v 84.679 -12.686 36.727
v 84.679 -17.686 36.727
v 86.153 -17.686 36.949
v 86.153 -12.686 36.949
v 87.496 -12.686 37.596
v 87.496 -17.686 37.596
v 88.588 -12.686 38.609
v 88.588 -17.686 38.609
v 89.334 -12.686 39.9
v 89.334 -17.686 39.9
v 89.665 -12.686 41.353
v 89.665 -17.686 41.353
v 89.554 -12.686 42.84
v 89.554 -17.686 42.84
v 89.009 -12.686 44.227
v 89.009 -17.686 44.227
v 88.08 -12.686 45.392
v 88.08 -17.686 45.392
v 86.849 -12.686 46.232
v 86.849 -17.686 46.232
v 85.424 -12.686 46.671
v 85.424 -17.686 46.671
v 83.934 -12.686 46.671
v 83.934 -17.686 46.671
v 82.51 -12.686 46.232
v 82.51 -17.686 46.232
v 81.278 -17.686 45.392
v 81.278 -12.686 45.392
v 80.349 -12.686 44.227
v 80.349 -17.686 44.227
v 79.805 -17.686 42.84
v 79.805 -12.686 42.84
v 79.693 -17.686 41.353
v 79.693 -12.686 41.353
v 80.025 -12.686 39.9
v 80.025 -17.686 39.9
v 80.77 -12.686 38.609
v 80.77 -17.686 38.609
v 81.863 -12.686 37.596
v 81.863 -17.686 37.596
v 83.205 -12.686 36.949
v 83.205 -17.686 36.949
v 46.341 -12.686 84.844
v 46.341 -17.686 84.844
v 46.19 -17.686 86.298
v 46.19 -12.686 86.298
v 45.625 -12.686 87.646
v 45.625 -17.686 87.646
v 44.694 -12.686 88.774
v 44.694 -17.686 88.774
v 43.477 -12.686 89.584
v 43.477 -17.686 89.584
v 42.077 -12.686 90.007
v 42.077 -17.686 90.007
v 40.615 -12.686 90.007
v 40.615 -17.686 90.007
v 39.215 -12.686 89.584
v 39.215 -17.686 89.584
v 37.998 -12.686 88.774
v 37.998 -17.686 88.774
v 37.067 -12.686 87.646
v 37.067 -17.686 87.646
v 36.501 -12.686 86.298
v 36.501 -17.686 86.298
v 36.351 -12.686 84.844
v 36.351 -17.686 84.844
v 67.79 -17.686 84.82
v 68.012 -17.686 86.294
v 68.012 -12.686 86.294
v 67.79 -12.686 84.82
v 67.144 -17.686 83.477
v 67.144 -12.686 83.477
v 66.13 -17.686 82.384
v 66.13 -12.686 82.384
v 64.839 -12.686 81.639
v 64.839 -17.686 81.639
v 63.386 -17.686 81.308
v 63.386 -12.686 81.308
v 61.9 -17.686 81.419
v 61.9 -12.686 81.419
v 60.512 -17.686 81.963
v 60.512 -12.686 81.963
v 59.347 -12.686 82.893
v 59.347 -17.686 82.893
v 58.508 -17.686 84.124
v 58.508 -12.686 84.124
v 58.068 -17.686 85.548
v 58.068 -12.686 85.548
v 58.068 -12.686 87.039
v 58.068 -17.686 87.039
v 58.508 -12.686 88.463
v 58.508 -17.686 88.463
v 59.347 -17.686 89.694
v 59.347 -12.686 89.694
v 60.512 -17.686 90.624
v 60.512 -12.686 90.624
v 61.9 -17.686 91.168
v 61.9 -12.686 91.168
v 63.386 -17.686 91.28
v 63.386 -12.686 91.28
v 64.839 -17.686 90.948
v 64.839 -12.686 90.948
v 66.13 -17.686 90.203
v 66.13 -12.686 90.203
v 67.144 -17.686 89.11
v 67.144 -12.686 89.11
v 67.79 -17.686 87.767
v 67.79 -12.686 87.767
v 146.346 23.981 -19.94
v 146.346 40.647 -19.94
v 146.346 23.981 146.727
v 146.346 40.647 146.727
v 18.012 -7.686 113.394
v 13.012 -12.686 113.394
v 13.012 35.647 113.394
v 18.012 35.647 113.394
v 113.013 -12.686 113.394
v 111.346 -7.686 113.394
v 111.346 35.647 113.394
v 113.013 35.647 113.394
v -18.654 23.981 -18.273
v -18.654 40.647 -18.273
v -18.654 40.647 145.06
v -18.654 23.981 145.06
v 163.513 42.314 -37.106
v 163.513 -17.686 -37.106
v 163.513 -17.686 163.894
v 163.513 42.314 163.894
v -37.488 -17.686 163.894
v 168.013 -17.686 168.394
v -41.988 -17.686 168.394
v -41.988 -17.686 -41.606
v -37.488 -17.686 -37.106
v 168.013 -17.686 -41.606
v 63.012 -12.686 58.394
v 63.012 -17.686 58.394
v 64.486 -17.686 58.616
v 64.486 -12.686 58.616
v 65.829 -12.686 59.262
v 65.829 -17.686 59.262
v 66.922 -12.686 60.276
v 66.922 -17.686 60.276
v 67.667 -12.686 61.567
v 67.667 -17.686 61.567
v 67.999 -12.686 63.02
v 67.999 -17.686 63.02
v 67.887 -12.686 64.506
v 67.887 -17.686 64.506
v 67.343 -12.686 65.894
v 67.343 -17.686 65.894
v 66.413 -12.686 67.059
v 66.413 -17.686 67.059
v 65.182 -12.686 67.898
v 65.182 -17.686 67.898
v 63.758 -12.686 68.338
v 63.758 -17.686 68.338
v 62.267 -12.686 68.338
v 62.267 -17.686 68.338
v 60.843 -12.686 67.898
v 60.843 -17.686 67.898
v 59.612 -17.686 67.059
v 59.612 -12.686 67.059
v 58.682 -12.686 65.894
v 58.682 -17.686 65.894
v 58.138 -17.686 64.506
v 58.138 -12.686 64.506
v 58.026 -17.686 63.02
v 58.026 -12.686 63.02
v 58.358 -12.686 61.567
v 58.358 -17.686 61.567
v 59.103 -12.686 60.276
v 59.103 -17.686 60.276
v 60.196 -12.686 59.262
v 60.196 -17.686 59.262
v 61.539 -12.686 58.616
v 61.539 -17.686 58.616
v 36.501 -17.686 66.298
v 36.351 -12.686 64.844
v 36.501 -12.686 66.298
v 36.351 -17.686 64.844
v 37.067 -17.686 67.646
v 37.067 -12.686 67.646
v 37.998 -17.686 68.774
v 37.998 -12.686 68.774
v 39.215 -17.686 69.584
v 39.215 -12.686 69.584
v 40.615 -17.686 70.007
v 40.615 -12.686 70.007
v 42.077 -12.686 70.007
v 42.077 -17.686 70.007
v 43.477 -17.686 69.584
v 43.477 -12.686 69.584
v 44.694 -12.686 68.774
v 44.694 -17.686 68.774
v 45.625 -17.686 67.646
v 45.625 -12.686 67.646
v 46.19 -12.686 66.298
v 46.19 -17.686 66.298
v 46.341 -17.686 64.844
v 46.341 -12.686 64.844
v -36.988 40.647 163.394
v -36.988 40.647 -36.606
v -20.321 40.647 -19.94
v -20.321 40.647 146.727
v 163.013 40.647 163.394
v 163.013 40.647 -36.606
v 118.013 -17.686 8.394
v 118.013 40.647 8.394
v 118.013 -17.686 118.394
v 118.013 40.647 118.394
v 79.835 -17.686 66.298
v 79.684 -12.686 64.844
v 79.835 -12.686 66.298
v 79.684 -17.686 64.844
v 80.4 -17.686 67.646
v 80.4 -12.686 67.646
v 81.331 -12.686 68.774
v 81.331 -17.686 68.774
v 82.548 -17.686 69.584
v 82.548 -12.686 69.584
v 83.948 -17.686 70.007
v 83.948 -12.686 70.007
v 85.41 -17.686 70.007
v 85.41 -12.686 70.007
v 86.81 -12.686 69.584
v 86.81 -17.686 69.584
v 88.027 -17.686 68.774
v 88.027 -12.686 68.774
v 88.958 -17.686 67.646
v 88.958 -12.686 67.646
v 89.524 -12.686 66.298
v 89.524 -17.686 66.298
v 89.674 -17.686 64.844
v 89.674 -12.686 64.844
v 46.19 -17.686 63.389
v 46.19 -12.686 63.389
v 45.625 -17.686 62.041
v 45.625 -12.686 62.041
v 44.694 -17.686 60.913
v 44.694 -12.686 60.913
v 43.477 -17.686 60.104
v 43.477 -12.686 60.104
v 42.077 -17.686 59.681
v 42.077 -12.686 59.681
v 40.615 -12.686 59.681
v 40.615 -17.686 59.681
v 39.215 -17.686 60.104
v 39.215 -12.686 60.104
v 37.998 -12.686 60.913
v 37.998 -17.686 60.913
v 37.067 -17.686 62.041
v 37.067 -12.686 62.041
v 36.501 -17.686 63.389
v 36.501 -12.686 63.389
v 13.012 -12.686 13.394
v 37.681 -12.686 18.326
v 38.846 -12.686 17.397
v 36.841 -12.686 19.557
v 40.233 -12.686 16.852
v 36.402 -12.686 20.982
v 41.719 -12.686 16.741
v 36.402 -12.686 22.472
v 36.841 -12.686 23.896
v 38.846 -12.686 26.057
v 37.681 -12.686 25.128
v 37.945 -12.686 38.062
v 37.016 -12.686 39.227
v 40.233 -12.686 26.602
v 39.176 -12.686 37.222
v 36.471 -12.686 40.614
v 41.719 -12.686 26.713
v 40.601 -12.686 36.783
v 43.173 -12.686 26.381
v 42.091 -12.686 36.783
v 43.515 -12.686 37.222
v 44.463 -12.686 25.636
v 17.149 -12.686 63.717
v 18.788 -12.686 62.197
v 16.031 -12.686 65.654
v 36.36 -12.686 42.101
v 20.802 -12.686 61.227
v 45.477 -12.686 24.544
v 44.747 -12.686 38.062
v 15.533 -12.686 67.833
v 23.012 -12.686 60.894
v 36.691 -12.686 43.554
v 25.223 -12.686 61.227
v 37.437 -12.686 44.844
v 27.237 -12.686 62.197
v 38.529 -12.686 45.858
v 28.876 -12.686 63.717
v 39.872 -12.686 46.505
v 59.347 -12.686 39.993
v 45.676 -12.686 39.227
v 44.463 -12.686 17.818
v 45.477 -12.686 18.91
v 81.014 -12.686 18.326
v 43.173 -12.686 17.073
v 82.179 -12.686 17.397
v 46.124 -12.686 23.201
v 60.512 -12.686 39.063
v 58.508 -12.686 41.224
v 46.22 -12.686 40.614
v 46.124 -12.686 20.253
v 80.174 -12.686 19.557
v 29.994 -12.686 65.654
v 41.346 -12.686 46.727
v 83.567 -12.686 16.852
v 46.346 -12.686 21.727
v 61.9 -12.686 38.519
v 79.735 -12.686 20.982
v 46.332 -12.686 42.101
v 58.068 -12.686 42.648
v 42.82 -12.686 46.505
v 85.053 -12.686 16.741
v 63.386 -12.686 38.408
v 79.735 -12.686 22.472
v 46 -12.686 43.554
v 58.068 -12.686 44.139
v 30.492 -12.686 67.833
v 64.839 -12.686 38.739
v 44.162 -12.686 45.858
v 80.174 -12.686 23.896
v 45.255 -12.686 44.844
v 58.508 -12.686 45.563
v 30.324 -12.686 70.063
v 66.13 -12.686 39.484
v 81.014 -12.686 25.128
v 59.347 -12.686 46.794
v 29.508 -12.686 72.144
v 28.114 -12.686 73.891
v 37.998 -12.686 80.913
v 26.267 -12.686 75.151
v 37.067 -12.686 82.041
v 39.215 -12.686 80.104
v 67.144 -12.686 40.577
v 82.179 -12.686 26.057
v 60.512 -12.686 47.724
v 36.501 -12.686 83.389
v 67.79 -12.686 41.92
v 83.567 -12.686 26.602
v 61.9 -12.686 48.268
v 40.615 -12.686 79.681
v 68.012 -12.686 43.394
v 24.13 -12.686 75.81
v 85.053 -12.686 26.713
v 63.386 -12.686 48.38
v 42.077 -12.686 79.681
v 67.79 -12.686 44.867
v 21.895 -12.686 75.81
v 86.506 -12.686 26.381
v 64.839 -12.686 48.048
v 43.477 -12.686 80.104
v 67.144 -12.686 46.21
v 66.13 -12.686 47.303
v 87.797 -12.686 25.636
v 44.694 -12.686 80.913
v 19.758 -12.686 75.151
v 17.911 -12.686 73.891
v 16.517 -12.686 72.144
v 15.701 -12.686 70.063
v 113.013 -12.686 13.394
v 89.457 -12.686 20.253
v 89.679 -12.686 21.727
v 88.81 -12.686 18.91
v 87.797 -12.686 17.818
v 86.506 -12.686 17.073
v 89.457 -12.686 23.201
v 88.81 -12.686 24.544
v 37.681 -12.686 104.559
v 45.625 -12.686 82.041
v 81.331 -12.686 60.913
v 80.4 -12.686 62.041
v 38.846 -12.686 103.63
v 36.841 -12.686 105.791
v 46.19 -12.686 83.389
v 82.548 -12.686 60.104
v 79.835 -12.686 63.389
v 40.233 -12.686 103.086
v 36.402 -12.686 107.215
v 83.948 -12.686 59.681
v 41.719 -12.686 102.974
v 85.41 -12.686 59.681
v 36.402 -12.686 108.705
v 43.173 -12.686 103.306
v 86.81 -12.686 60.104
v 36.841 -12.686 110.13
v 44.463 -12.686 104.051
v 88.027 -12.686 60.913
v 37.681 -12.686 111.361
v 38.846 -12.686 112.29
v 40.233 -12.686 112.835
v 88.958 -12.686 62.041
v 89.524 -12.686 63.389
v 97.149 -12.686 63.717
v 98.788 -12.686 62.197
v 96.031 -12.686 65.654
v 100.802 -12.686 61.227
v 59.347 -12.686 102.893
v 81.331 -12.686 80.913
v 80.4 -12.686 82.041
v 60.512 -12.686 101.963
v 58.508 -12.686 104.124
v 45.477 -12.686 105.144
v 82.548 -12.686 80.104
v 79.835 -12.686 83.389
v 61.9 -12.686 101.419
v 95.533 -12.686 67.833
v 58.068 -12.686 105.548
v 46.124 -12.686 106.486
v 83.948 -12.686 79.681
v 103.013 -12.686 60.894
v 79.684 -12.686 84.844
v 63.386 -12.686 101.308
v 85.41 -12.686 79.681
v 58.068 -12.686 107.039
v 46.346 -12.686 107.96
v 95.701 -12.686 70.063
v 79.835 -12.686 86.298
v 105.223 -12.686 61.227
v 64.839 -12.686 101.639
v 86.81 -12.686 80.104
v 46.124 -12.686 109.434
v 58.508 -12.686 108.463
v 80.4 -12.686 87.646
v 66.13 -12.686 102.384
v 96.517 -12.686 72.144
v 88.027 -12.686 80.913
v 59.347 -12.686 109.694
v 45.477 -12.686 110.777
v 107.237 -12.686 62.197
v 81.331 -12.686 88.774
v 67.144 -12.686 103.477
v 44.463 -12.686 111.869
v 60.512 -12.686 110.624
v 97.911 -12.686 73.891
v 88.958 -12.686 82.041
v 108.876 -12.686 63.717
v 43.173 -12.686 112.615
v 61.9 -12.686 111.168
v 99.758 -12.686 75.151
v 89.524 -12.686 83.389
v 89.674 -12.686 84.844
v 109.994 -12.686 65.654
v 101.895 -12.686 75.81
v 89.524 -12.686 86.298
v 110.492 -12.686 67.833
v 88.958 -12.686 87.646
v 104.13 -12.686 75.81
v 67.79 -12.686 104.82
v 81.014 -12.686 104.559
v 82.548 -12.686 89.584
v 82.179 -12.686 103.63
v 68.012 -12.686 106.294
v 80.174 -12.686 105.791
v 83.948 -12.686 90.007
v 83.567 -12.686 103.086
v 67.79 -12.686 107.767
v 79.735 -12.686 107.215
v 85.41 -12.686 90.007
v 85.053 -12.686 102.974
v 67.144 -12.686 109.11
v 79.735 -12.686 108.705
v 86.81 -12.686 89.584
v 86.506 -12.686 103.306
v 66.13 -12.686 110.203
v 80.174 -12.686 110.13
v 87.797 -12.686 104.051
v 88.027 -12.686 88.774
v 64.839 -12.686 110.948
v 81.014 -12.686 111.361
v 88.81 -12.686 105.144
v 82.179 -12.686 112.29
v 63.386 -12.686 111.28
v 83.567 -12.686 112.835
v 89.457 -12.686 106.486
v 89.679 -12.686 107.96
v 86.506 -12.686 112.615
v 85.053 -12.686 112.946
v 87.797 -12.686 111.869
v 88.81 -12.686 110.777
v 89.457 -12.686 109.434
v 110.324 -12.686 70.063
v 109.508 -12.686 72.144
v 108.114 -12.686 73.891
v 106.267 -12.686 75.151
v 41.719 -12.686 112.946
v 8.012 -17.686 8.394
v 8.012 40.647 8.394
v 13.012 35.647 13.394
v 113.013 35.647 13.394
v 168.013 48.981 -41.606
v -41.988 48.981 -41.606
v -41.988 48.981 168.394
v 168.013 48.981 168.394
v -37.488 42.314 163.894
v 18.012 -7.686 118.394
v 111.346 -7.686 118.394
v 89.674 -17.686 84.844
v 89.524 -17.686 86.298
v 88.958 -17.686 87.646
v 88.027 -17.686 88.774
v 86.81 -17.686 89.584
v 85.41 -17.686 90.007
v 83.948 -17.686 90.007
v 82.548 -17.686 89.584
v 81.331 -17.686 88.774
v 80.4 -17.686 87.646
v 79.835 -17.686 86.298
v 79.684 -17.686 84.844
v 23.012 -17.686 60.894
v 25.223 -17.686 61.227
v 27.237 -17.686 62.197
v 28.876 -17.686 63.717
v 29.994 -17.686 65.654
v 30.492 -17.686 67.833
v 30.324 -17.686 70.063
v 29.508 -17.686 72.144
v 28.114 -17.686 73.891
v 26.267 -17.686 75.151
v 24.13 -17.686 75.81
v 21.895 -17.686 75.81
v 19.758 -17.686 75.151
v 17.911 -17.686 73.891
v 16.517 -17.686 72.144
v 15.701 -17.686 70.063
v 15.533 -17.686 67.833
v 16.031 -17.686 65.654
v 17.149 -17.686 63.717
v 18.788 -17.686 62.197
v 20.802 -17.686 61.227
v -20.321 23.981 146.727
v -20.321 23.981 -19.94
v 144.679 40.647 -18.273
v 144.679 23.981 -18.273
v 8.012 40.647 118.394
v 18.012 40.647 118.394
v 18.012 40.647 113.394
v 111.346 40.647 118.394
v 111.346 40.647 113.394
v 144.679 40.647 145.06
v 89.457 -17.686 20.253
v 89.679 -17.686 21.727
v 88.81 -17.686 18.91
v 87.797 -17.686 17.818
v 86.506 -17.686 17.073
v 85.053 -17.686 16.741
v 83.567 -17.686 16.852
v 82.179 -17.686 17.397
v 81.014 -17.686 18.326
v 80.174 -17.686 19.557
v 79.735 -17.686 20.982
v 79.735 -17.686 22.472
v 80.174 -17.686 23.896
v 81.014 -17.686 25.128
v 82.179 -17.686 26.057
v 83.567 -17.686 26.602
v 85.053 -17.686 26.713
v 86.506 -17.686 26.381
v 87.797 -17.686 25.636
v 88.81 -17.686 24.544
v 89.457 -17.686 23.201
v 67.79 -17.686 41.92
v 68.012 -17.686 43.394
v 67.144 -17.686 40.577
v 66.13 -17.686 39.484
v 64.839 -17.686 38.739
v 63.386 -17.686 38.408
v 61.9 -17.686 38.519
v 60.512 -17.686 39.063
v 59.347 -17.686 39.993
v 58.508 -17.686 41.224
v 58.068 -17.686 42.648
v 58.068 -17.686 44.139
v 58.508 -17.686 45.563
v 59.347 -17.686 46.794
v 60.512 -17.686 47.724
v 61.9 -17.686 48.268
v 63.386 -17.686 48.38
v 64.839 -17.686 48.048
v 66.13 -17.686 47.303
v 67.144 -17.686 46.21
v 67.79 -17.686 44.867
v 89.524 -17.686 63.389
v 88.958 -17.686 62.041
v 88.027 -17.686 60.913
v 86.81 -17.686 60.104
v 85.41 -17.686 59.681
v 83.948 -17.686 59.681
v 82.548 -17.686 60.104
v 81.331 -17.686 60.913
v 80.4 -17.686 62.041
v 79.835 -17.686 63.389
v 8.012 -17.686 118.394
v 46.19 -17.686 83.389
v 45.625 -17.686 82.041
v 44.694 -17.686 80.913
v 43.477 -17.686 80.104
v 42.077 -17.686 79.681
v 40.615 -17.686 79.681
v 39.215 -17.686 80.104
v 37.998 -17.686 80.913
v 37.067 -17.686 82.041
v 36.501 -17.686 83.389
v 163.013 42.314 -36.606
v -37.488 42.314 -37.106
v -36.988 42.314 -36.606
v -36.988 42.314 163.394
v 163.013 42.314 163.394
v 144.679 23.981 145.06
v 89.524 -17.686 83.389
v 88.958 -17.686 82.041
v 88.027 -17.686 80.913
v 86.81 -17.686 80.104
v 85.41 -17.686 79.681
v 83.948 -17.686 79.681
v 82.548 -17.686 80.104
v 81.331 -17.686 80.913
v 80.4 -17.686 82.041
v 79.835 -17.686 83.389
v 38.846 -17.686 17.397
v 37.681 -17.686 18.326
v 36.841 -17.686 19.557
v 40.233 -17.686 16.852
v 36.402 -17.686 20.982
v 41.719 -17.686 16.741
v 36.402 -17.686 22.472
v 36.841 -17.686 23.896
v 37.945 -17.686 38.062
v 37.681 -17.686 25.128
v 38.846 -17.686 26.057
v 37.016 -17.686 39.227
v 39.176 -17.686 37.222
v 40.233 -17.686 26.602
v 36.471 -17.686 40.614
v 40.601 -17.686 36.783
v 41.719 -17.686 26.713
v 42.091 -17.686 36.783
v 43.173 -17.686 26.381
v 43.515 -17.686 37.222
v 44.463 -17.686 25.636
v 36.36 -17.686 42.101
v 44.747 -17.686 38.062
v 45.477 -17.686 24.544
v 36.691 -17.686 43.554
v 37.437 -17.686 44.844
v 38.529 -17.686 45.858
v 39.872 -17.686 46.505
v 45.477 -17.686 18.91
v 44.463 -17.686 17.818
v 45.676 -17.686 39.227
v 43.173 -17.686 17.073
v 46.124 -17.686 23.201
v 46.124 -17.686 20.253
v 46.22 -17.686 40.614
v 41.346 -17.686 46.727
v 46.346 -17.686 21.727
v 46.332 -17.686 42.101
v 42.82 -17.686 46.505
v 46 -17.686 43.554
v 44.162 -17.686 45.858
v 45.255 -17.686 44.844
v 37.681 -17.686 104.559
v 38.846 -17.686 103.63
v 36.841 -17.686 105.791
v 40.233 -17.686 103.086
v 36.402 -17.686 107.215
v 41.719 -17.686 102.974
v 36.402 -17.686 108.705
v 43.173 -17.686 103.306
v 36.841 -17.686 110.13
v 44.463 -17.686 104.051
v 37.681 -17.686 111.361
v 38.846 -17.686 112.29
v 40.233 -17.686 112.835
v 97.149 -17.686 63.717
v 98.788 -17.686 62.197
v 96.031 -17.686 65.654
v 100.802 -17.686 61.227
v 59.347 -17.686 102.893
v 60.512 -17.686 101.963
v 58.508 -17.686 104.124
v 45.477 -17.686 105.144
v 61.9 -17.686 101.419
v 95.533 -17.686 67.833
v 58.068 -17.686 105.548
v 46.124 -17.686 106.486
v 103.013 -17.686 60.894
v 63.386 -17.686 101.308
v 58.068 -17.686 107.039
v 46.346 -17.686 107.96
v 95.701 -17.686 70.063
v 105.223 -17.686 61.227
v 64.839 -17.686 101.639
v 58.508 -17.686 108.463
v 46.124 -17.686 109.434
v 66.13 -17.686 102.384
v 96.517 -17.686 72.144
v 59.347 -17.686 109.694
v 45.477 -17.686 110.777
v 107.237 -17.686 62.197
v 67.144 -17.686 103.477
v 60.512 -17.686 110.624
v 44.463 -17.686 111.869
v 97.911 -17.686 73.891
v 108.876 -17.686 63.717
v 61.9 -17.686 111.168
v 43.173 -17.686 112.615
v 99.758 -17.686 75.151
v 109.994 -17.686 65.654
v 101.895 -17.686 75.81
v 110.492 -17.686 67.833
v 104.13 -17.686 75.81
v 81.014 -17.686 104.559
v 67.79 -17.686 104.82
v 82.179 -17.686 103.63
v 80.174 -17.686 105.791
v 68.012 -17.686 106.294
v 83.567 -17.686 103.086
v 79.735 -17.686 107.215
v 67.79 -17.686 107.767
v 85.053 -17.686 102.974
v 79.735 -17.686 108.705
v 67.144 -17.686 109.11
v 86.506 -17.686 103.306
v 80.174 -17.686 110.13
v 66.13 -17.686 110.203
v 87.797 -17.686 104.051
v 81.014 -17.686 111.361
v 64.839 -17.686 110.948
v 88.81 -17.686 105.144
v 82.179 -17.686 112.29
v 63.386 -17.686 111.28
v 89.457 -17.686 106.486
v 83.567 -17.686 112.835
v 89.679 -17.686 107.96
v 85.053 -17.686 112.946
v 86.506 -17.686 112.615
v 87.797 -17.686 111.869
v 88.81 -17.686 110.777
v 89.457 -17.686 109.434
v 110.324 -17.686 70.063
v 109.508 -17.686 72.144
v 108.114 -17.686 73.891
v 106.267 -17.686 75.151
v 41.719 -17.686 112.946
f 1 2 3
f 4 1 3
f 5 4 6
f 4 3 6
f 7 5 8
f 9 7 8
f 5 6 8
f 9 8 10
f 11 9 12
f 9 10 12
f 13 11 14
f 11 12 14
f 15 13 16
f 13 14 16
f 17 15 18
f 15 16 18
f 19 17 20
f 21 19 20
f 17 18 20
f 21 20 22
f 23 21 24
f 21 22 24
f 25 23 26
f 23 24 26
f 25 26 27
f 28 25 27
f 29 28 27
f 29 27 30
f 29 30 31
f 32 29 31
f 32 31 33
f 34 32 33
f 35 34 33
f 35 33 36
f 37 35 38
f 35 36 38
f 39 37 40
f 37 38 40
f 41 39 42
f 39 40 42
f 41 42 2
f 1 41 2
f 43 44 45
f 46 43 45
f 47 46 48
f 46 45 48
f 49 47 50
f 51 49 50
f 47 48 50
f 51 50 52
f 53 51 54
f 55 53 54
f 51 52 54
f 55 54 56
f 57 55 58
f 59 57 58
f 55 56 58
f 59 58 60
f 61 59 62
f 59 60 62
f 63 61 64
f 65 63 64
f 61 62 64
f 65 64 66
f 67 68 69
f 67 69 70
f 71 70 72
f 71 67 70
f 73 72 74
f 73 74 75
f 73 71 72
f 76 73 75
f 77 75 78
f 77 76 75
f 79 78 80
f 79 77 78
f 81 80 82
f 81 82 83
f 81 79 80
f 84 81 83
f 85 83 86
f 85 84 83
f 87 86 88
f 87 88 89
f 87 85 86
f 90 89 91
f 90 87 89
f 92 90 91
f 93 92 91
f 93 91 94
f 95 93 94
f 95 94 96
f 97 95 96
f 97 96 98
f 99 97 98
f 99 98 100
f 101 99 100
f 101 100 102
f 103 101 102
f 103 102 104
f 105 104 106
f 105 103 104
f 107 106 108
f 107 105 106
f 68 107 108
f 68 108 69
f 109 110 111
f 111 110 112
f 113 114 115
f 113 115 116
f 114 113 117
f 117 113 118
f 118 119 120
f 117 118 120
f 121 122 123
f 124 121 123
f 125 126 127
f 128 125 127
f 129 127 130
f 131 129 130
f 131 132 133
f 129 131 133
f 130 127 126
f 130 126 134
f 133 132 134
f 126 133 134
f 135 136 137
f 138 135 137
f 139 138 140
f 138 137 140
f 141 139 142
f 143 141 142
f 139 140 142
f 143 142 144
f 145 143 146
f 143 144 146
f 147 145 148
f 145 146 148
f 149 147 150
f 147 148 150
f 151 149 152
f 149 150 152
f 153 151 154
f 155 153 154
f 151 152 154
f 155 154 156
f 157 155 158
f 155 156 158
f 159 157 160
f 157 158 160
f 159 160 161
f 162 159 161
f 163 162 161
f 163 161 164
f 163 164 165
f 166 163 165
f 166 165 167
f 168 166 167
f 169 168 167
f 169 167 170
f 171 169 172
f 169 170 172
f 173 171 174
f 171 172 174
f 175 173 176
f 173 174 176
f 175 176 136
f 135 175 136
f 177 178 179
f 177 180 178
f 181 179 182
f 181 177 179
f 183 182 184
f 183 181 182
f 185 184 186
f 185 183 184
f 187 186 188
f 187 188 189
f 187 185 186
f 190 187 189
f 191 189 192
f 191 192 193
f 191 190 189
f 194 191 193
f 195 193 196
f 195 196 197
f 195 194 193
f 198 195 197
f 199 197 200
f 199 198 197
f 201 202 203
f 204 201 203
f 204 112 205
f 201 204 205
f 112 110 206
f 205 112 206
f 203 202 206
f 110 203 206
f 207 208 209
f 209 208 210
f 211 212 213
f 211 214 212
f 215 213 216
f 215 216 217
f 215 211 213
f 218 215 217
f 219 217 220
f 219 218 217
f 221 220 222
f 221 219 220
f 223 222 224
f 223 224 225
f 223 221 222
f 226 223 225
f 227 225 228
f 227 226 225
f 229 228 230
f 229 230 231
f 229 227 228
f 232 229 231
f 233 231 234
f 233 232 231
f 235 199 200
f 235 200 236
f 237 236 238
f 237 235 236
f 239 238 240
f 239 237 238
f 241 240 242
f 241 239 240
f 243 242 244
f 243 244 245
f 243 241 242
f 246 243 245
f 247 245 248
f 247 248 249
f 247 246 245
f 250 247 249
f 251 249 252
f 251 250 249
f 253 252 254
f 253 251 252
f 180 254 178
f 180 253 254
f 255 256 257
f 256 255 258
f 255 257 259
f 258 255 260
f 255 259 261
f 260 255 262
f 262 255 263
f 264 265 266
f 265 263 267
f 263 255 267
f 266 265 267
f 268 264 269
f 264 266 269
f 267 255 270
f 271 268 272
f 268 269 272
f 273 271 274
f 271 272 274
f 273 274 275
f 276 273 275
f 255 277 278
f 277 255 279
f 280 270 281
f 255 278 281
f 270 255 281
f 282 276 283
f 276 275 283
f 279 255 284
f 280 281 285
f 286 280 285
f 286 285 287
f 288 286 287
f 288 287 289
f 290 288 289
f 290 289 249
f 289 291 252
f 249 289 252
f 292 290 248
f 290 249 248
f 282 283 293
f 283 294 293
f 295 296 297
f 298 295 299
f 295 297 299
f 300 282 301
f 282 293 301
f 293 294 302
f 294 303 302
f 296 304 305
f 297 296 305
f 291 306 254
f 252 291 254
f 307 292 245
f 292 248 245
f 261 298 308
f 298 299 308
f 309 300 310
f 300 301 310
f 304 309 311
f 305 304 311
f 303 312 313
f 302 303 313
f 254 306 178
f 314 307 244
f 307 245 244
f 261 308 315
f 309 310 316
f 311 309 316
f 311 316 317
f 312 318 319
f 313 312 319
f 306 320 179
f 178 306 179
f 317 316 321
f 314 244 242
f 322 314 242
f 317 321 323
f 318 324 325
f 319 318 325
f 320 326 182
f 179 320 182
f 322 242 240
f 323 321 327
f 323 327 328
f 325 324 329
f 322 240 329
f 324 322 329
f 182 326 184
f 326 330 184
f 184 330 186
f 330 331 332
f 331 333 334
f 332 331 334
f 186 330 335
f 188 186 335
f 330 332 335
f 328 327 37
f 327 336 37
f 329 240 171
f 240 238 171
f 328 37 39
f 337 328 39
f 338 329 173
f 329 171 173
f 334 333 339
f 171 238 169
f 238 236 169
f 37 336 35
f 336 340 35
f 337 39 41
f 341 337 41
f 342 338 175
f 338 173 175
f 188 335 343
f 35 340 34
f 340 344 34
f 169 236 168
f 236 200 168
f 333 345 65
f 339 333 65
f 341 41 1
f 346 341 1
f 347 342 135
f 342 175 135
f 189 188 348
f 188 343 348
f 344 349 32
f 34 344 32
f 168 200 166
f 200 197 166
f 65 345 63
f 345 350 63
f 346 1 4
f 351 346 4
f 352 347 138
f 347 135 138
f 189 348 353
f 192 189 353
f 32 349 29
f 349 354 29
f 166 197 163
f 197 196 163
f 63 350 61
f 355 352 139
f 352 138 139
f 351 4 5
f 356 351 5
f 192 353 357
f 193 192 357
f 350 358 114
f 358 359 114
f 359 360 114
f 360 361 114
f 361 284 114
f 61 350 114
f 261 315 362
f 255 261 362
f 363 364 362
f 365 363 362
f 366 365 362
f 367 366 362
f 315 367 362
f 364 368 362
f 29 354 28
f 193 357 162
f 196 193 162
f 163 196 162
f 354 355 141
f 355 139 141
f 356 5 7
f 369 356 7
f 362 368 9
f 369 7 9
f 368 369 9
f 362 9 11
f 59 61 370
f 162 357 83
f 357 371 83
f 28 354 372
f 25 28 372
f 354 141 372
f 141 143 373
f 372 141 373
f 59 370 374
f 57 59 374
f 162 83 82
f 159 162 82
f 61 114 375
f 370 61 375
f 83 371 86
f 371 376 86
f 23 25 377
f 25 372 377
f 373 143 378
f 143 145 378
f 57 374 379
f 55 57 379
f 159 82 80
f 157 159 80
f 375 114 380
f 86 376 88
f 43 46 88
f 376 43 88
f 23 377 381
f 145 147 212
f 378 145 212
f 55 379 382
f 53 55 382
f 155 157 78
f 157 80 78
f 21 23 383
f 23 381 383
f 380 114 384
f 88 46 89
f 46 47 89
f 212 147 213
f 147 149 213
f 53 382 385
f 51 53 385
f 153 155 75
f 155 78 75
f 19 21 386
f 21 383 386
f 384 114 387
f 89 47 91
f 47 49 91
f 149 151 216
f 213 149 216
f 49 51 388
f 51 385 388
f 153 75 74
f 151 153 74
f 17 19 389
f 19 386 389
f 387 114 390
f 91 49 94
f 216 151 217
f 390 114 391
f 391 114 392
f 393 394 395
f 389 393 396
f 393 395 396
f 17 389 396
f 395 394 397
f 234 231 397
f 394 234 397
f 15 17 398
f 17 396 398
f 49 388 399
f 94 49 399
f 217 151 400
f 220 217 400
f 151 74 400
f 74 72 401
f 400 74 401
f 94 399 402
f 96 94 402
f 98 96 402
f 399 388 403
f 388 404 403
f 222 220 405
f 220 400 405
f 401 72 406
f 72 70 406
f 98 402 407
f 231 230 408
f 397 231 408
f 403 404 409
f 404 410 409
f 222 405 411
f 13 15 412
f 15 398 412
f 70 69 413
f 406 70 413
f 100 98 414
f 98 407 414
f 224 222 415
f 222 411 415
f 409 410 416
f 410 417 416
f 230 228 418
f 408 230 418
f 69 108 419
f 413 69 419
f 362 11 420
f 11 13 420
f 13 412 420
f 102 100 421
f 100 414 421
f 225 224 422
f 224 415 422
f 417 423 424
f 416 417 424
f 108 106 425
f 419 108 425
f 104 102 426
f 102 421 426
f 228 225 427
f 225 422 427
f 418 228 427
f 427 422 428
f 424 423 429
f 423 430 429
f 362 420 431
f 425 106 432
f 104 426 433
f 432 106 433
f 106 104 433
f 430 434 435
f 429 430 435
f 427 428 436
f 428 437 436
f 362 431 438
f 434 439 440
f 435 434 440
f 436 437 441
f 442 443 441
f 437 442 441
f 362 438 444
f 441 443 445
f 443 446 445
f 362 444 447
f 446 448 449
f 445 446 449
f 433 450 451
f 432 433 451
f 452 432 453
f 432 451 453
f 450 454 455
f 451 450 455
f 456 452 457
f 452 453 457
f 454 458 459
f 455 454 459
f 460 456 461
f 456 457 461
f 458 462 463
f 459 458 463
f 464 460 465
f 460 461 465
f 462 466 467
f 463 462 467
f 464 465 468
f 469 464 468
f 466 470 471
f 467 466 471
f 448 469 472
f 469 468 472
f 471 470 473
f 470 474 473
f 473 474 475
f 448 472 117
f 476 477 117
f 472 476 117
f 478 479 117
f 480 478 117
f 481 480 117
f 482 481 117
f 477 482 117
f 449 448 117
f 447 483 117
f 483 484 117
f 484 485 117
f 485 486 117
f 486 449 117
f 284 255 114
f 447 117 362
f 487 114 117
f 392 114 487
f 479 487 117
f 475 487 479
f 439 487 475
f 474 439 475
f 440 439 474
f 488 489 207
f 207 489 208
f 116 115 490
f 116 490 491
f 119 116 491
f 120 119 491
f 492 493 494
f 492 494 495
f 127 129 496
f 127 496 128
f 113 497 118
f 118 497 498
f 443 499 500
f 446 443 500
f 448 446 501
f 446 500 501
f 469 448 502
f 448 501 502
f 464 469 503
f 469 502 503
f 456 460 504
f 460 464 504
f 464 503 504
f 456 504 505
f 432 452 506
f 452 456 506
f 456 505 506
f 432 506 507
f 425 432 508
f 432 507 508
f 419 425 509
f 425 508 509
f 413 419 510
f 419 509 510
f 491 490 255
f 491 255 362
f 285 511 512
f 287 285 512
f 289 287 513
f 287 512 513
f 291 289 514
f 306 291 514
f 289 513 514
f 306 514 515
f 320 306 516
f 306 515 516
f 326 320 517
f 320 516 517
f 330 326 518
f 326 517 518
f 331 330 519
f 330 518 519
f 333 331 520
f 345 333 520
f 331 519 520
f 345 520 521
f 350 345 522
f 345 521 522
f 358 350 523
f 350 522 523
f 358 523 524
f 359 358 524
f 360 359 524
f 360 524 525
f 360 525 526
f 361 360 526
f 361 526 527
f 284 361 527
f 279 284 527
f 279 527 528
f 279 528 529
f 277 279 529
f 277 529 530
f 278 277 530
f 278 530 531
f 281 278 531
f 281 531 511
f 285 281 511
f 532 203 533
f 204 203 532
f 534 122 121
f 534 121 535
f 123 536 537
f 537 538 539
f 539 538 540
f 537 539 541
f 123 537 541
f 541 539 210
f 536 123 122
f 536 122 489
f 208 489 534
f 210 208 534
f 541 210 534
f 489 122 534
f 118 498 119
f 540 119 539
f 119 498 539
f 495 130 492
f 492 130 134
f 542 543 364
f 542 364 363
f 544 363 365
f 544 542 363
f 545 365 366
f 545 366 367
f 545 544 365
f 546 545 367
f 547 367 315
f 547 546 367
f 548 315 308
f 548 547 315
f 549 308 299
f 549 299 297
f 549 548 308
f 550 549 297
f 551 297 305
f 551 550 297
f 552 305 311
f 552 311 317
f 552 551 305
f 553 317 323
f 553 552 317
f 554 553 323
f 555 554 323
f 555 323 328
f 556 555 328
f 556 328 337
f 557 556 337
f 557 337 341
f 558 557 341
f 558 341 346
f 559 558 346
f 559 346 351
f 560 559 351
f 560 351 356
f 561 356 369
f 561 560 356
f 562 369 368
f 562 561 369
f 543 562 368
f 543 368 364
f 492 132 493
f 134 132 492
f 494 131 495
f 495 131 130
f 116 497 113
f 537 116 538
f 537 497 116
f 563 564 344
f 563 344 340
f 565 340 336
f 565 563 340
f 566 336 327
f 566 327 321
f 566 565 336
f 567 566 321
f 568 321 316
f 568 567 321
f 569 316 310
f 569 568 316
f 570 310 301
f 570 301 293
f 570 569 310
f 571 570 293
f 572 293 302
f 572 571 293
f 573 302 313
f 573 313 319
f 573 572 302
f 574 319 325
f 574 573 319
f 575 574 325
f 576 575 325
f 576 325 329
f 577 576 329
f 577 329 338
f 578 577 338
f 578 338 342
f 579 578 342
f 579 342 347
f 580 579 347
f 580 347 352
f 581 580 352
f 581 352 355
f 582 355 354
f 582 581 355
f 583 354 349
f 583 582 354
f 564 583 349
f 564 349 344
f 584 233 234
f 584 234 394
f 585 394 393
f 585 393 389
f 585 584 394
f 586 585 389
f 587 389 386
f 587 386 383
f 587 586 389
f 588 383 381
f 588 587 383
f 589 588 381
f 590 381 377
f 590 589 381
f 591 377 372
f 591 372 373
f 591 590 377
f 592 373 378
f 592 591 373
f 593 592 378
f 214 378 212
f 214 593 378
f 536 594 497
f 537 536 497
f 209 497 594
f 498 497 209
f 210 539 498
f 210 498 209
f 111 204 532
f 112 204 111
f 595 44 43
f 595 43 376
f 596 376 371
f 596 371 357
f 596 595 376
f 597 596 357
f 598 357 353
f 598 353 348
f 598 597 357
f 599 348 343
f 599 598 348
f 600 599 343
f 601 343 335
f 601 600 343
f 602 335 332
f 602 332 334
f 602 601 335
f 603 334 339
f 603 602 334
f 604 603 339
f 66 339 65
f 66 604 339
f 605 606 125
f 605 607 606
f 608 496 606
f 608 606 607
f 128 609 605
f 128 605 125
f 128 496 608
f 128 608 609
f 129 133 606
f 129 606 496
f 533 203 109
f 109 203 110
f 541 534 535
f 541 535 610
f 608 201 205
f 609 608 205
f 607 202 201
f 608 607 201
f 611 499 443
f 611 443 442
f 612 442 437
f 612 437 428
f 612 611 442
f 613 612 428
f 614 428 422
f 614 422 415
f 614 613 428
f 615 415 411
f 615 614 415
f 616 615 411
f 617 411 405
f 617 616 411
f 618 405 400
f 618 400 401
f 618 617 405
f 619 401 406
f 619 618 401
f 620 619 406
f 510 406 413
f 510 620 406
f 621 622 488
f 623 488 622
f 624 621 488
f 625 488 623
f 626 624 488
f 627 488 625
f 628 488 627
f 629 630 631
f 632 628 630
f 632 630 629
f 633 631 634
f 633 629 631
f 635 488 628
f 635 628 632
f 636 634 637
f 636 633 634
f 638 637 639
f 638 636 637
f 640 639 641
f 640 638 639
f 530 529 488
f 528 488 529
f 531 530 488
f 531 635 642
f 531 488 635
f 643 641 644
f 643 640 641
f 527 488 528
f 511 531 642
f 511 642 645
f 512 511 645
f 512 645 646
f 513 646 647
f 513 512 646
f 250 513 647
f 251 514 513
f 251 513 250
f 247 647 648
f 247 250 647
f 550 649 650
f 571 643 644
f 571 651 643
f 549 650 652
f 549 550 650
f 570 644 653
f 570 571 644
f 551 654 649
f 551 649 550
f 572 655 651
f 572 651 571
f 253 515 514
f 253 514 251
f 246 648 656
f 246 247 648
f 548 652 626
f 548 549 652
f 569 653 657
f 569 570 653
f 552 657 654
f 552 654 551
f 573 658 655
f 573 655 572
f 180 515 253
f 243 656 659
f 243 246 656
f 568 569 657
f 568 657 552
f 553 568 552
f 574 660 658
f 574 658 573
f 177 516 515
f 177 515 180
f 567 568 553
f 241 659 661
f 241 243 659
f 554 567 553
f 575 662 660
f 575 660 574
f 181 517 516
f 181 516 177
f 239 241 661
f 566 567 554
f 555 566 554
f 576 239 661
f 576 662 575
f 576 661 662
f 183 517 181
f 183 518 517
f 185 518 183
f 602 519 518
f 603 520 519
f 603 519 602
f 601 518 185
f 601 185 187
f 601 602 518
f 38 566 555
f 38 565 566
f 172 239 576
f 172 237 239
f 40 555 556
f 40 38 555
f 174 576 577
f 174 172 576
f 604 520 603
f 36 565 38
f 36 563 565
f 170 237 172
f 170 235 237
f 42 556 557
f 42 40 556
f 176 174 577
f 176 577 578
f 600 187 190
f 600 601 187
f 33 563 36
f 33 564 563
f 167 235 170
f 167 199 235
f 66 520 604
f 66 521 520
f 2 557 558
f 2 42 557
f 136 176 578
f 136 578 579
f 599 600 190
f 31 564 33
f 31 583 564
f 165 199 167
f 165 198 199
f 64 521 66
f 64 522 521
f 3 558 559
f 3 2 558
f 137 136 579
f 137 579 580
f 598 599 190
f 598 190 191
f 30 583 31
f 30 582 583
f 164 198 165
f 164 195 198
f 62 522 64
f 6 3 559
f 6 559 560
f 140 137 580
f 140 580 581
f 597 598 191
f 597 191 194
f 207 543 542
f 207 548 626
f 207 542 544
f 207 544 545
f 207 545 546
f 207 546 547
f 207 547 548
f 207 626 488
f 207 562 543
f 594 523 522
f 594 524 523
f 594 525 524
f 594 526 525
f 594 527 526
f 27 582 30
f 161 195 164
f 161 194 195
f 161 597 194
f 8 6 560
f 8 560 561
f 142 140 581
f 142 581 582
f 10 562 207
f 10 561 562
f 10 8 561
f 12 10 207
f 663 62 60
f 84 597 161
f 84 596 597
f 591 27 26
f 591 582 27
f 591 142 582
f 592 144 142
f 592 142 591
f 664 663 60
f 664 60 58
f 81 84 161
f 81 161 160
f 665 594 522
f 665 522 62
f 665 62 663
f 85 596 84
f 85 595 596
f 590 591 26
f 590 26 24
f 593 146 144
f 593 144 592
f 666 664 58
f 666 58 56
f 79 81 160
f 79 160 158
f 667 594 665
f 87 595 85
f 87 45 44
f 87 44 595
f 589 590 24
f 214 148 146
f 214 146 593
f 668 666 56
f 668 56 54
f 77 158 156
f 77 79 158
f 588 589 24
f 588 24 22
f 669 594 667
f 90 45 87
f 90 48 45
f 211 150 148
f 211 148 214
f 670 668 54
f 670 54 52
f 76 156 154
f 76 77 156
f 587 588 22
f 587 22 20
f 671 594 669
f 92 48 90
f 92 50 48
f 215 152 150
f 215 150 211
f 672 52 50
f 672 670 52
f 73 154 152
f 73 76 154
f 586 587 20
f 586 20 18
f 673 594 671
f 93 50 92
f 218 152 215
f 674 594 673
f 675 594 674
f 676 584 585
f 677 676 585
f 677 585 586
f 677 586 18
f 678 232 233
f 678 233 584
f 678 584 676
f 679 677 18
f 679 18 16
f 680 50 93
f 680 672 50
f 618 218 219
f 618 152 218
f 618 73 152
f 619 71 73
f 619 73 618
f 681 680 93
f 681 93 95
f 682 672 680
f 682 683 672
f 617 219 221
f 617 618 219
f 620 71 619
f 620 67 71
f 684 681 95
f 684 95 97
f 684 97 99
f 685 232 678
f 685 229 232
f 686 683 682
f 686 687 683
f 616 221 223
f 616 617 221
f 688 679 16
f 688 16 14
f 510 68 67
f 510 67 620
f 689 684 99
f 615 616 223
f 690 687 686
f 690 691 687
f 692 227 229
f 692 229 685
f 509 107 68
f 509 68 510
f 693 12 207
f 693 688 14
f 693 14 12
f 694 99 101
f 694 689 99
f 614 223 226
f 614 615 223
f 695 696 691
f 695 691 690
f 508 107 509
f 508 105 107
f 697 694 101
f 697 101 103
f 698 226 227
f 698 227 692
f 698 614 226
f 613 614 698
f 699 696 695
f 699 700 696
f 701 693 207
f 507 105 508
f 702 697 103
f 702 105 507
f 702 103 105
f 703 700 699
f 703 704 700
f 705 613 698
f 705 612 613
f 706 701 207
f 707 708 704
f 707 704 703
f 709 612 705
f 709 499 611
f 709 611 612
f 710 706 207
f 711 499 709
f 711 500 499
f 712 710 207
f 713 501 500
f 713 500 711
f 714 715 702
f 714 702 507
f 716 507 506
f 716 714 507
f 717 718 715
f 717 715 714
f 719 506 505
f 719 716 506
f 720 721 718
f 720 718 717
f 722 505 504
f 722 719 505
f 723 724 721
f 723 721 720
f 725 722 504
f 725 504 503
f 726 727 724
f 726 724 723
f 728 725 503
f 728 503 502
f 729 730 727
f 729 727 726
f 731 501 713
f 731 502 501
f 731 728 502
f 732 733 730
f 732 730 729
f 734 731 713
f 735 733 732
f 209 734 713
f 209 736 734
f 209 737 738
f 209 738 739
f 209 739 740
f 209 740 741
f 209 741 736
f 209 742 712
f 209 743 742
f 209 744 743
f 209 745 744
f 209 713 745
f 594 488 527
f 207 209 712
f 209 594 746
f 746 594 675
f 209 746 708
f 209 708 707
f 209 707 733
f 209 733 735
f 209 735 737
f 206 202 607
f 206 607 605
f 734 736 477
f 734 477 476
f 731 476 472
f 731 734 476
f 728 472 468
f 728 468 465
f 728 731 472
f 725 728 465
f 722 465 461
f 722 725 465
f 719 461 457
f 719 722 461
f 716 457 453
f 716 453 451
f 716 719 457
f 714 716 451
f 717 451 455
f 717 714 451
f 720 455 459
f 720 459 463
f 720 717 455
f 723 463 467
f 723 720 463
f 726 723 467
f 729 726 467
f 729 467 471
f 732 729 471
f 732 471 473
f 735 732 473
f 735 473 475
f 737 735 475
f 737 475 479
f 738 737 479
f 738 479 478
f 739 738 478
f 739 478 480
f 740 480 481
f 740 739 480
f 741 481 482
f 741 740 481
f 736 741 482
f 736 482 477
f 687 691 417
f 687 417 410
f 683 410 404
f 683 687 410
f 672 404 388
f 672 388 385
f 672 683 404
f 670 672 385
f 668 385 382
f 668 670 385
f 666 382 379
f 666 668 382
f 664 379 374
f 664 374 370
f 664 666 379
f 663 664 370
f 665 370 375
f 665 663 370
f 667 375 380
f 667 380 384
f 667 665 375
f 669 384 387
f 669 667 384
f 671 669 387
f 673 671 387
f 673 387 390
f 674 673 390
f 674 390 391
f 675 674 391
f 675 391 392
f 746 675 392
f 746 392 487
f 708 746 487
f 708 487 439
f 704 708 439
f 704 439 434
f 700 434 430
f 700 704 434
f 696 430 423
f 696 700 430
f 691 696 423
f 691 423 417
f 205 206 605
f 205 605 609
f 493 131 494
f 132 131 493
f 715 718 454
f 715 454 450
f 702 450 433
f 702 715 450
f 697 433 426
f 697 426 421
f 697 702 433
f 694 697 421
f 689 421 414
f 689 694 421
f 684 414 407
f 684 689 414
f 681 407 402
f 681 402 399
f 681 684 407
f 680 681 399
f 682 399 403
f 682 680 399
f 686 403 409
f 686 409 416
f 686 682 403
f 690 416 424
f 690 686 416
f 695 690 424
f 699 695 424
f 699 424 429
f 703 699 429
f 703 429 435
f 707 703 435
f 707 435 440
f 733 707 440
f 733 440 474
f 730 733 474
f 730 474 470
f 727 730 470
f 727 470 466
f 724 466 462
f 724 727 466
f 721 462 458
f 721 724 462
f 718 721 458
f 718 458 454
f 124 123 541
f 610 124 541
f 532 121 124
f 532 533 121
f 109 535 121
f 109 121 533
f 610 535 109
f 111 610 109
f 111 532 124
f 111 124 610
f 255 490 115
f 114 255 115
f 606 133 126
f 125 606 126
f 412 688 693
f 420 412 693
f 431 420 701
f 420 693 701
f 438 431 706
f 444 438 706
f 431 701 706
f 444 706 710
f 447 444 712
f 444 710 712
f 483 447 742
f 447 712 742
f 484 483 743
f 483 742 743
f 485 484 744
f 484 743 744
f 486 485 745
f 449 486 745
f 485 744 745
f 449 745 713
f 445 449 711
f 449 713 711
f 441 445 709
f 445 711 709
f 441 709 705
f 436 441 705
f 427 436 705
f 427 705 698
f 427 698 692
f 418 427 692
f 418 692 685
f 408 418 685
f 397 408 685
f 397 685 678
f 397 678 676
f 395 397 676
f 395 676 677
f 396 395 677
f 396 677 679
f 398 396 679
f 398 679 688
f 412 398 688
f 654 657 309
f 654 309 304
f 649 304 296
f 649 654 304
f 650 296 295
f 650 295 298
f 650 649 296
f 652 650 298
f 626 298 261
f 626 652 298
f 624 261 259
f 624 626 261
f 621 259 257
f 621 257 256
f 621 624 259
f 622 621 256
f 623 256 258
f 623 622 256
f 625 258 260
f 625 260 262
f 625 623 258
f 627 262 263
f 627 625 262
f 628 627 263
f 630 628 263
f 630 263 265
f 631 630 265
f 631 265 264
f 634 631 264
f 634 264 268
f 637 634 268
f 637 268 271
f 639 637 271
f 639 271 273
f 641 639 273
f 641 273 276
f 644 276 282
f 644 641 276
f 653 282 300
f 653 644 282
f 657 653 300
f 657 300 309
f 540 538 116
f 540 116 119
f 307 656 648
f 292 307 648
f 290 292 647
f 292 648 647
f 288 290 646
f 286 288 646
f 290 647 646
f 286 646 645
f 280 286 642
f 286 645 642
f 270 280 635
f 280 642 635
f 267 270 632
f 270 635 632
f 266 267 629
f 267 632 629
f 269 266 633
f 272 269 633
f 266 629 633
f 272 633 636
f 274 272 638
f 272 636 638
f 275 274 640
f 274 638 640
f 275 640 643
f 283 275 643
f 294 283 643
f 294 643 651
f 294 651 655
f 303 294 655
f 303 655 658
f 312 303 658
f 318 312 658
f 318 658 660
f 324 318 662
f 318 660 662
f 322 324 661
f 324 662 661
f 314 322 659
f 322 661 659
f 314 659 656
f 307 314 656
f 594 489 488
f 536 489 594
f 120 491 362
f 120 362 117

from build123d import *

# Parameters (mm, degrees)
SKETCH_1_W                 = 126
SKETCH_1_H                 = 126
EXTRUDE_2_DEPTH            = 40
SKETCH_7_W                 = 120
SKETCH_7_H                 = 120
CUT_EXTRUDE_1_DEPTH        = 35
EXTRUDE_3_OUTLINE_W        = 66
EXTRUDE_3_OUTLINE_H        = 66
EXTRUDE_3_OUTLINE_W_2      = 60
EXTRUDE_3_OUTLINE_H_2      = 60
EXTRUDE_3_DEPTH            = 35
EXTRUDE_3_2_OUTLINE_W      = 60
EXTRUDE_3_2_OUTLINE_H      = 60
EXTRUDE_3_2_DEPTH          = 3
EXTRUDE_START              = 32
EXTRUDE_3_3_OUTLINE_W      = 60
EXTRUDE_3_3_OUTLINE_H      = 60
EXTRUDE_3_3_DEPTH          = 3
SKETCH_9_W                 = 56
SKETCH_9_H                 = 20
CUT_EXTRUDE_2_DEPTH        = 3
SKETCH_10_W                = 100
SKETCH_10_H                = 100
SKETCH_10_W_2              = 98
SKETCH_10_H_2              = 98
EXTRUDE_3_4_DEPTH          = 10
SKETCH_11_R                = 3
CUT_EXTRUDE_3_DEPTH        = 3
SCALE_1_SCALE              = 1.666667
SKETCH_13_W                = 201.00004
SKETCH_13_H                = 201.00004
SKETCH_13_W_2              = 200.00004
SKETCH_13_H_2              = 200.00004
CUT_EXTRUDE_4_DEPTH        = 60
SKETCH_14_W                = 93.333352
SKETCH_14_H                = 15.000005
CUT_EXTRUDE_5_DEPTH        = 60
PATTERN_START              = -17.686023251
PATTERN_LINEAR_2_OUTLINE_R = 5.000001
PATTERN_LINEAR_2_DEPTH     = 5.000001
PATTERN_LINEAR_3_OUTLINE_R = 5.000001
PATTERN_LINEAR_3_DEPTH     = 5.000001
SKETCH_15_R                = 7.5
CUT_EXTRUDE_6_DEPTH        = 30


# Read off the part's stored shape, not the designer's step: 拉伸-薄壁3, 阵列(线性)2, 阵列(线性)3
with BuildPart() as part:
    # 草图1 → 凸台-拉伸2 (new body)
    with BuildSketch(Plane(origin=(0, 0, 0), x_dir=(1, 0, 0), z_dir=(0, 1, 0))):
        with Locations((63, -63)):
            Rectangle(SKETCH_1_W, SKETCH_1_H)
    extrude(amount=EXTRUDE_2_DEPTH)

    # 草图7 → 切除-拉伸1 (cut)
    with BuildSketch(Plane(origin=(0, 0, 0), x_dir=(1, 0, 0), z_dir=(0, 1, 0))):
        with Locations((63, -63)):
            Rectangle(SKETCH_7_W, SKETCH_7_H)
    extrude(amount=CUT_EXTRUDE_1_DEPTH, mode=Mode.SUBTRACT)

    # Extrude 3 outline → Extrude 3 (add)
    with BuildSketch(Plane.XZ.offset(-35)):
        with Locations((63, 63)):
            Rectangle(EXTRUDE_3_OUTLINE_W, EXTRUDE_3_OUTLINE_H)
        with Locations((63, 63)):
            Rectangle(EXTRUDE_3_OUTLINE_W_2, EXTRUDE_3_OUTLINE_H_2, mode=Mode.SUBTRACT)
    extrude(amount=EXTRUDE_3_DEPTH)

    # Extrude 3 2 outline → Extrude 3 2 (add)
    with BuildSketch(Plane.XZ.offset(-35)):
        with Locations((63, 63)):
            Rectangle(EXTRUDE_3_2_OUTLINE_W, EXTRUDE_3_2_OUTLINE_H)
    extrude(amount=EXTRUDE_3_2_DEPTH)

    # Extrude 3 3 outline → Extrude 3 3 (add)
    with BuildSketch(Plane.XZ.offset(-35).offset(EXTRUDE_START)):
        with Locations((63, 63)):
            Rectangle(EXTRUDE_3_3_OUTLINE_W, EXTRUDE_3_3_OUTLINE_H)
    extrude(amount=EXTRUDE_3_3_DEPTH)

    # 草图9 → 切除-拉伸2 (cut)
    with BuildSketch(Plane.XY.offset(96)):
        with Locations((64, 25)):
            Rectangle(SKETCH_9_W, SKETCH_9_H)
    extrude(amount=-CUT_EXTRUDE_2_DEPTH, mode=Mode.SUBTRACT)

    # 草图10 → Extrude 3 4 (add)
    with BuildSketch(Plane.XZ.offset(-35)):
        with Locations((63, 63)):
            Rectangle(SKETCH_10_W, SKETCH_10_H)
        with Locations((63, 63)):
            Rectangle(SKETCH_10_W_2, SKETCH_10_H_2, mode=Mode.SUBTRACT)
    extrude(amount=EXTRUDE_3_4_DEPTH)

    # 草图11 → 切除-拉伸3 (cut)
    with BuildSketch(Plane.XZ):
        with Locations(Location((50, 76, 0), (0, 0, 270))):
            Circle(SKETCH_11_R)
        with Locations(Location((76, 76, 0), (0, 0, 90))):
            Circle(SKETCH_11_R)
        with Locations(Location((76, 50, 0), (0, 0, 270))):
            Circle(SKETCH_11_R)
        with Locations(Location((50, 50, 0), (0, 0, 90))):
            Circle(SKETCH_11_R)
        with Locations(Location((63, 63, 0), (0, 0, 270))):
            Circle(SKETCH_11_R)
    extrude(amount=-CUT_EXTRUDE_3_DEPTH, mode=Mode.SUBTRACT)


with BuildPart() as part_1:
    # 缩放比例1: scaled about (62.981257937, 26.529021612, 62.409625003)
    add(part.part.scale(SCALE_1_SCALE).moved(Location((-41.987526285, -17.686023251, -41.606437472))))

    # 草图13 → 切除-拉伸4 (cut)
    with BuildSketch(Plane.XZ.offset(17.686023251)):
        with Locations((63.012494715, 63.393583528)):
            Rectangle(SKETCH_13_W, SKETCH_13_H)
        with Locations((63.012494715, 63.393583528)):
            Rectangle(SKETCH_13_W_2, SKETCH_13_H_2, mode=Mode.SUBTRACT)
    extrude(amount=-CUT_EXTRUDE_4_DEPTH, mode=Mode.SUBTRACT)

    # 草图14 → 切除-拉伸5 (cut)
    with BuildSketch(Plane.XY.offset(118.393594528)):
        with Locations((64.679161715, -0.186020751)):
            Rectangle(SKETCH_14_W, SKETCH_14_H)
    extrude(amount=-CUT_EXTRUDE_5_DEPTH, mode=Mode.SUBTRACT)

    # 阵列(线性)2 outline → 阵列(线性)2 (cut)
    with BuildSketch(Plane(origin=(0, 0, 0), x_dir=(1, 0, 0), z_dir=(0, 1, 0)).offset(PATTERN_START)):
        with Locations((63.012494715, -43.393583528)):
            Circle(PATTERN_LINEAR_2_OUTLINE_R)
        with Locations((41.345823715, -65.060254528)):
            Circle(PATTERN_LINEAR_2_OUTLINE_R)
        with Locations((84.679165715, -65.060254528)):
            Circle(PATTERN_LINEAR_2_OUTLINE_R)
        with Locations((84.679165715, -21.726912528)):
            Circle(PATTERN_LINEAR_2_OUTLINE_R)
        with Locations((41.345823715, -21.726912528)):
            Circle(PATTERN_LINEAR_2_OUTLINE_R)
    extrude(amount=PATTERN_LINEAR_2_DEPTH, mode=Mode.SUBTRACT)

    # 阵列(线性)3 outline → 阵列(线性)3 (cut)
    with BuildSketch(Plane(origin=(0, 0, 0), x_dir=(1, 0, 0), z_dir=(0, 1, 0)).offset(PATTERN_START)):
        with Locations((63.012494715, -86.293583528)):
            Circle(PATTERN_LINEAR_3_OUTLINE_R)
        with Locations((63.012494715, -106.293583528)):
            Circle(PATTERN_LINEAR_3_OUTLINE_R)
        with Locations((41.345823715, -107.960254528)):
            Circle(PATTERN_LINEAR_3_OUTLINE_R)
        with Locations((84.679165715, -107.960254528)):
            Circle(PATTERN_LINEAR_3_OUTLINE_R)
        with BuildLine():
            ThreePointArc((89.674469878, -64.843583528), (84.679165715, -59.626911528), (79.683861552, -64.843583528))
            ThreePointArc((79.683861552, -64.843583528), (84.679165715, -60.060253528), (89.674469878, -64.843583528))
        make_face()
        with BuildLine():
            ThreePointArc((89.674469878, -84.843583528), (84.679165715, -79.626911528), (79.683861552, -84.843583528))
            ThreePointArc((79.683861552, -84.843583528), (84.679165715, -80.060253528), (89.674469878, -84.843583528))
        make_face()
        with BuildLine():
            ThreePointArc((46.341127878, -64.843583528), (41.345823715, -59.626911528), (36.350519552, -64.843583528))
            ThreePointArc((36.350519552, -64.843583528), (41.345823715, -60.060253528), (46.341127878, -64.843583528))
        make_face()
        with BuildLine():
            ThreePointArc((46.341127878, -84.843583528), (41.345823715, -79.626911528), (36.350519552, -84.843583528))
            ThreePointArc((36.350519552, -84.843583528), (41.345823715, -80.060253528), (46.341127878, -84.843583528))
        make_face()
    extrude(amount=PATTERN_LINEAR_3_DEPTH, mode=Mode.SUBTRACT)

    # 草图15 → 切除-拉伸6 (cut)
    with BuildSketch(Plane.XZ.offset(17.686023251)):
        with Locations(Location((103.012505715, 68.393594528, 0), (0, 0, 270))):
            Circle(SKETCH_15_R)
        with Locations(Location((23.012483715, 68.393594528, 0), (0, 0, 270))):
            Circle(SKETCH_15_R)
    extrude(amount=-CUT_EXTRUDE_6_DEPTH, mode=Mode.SUBTRACT)


solid = part_1.part
